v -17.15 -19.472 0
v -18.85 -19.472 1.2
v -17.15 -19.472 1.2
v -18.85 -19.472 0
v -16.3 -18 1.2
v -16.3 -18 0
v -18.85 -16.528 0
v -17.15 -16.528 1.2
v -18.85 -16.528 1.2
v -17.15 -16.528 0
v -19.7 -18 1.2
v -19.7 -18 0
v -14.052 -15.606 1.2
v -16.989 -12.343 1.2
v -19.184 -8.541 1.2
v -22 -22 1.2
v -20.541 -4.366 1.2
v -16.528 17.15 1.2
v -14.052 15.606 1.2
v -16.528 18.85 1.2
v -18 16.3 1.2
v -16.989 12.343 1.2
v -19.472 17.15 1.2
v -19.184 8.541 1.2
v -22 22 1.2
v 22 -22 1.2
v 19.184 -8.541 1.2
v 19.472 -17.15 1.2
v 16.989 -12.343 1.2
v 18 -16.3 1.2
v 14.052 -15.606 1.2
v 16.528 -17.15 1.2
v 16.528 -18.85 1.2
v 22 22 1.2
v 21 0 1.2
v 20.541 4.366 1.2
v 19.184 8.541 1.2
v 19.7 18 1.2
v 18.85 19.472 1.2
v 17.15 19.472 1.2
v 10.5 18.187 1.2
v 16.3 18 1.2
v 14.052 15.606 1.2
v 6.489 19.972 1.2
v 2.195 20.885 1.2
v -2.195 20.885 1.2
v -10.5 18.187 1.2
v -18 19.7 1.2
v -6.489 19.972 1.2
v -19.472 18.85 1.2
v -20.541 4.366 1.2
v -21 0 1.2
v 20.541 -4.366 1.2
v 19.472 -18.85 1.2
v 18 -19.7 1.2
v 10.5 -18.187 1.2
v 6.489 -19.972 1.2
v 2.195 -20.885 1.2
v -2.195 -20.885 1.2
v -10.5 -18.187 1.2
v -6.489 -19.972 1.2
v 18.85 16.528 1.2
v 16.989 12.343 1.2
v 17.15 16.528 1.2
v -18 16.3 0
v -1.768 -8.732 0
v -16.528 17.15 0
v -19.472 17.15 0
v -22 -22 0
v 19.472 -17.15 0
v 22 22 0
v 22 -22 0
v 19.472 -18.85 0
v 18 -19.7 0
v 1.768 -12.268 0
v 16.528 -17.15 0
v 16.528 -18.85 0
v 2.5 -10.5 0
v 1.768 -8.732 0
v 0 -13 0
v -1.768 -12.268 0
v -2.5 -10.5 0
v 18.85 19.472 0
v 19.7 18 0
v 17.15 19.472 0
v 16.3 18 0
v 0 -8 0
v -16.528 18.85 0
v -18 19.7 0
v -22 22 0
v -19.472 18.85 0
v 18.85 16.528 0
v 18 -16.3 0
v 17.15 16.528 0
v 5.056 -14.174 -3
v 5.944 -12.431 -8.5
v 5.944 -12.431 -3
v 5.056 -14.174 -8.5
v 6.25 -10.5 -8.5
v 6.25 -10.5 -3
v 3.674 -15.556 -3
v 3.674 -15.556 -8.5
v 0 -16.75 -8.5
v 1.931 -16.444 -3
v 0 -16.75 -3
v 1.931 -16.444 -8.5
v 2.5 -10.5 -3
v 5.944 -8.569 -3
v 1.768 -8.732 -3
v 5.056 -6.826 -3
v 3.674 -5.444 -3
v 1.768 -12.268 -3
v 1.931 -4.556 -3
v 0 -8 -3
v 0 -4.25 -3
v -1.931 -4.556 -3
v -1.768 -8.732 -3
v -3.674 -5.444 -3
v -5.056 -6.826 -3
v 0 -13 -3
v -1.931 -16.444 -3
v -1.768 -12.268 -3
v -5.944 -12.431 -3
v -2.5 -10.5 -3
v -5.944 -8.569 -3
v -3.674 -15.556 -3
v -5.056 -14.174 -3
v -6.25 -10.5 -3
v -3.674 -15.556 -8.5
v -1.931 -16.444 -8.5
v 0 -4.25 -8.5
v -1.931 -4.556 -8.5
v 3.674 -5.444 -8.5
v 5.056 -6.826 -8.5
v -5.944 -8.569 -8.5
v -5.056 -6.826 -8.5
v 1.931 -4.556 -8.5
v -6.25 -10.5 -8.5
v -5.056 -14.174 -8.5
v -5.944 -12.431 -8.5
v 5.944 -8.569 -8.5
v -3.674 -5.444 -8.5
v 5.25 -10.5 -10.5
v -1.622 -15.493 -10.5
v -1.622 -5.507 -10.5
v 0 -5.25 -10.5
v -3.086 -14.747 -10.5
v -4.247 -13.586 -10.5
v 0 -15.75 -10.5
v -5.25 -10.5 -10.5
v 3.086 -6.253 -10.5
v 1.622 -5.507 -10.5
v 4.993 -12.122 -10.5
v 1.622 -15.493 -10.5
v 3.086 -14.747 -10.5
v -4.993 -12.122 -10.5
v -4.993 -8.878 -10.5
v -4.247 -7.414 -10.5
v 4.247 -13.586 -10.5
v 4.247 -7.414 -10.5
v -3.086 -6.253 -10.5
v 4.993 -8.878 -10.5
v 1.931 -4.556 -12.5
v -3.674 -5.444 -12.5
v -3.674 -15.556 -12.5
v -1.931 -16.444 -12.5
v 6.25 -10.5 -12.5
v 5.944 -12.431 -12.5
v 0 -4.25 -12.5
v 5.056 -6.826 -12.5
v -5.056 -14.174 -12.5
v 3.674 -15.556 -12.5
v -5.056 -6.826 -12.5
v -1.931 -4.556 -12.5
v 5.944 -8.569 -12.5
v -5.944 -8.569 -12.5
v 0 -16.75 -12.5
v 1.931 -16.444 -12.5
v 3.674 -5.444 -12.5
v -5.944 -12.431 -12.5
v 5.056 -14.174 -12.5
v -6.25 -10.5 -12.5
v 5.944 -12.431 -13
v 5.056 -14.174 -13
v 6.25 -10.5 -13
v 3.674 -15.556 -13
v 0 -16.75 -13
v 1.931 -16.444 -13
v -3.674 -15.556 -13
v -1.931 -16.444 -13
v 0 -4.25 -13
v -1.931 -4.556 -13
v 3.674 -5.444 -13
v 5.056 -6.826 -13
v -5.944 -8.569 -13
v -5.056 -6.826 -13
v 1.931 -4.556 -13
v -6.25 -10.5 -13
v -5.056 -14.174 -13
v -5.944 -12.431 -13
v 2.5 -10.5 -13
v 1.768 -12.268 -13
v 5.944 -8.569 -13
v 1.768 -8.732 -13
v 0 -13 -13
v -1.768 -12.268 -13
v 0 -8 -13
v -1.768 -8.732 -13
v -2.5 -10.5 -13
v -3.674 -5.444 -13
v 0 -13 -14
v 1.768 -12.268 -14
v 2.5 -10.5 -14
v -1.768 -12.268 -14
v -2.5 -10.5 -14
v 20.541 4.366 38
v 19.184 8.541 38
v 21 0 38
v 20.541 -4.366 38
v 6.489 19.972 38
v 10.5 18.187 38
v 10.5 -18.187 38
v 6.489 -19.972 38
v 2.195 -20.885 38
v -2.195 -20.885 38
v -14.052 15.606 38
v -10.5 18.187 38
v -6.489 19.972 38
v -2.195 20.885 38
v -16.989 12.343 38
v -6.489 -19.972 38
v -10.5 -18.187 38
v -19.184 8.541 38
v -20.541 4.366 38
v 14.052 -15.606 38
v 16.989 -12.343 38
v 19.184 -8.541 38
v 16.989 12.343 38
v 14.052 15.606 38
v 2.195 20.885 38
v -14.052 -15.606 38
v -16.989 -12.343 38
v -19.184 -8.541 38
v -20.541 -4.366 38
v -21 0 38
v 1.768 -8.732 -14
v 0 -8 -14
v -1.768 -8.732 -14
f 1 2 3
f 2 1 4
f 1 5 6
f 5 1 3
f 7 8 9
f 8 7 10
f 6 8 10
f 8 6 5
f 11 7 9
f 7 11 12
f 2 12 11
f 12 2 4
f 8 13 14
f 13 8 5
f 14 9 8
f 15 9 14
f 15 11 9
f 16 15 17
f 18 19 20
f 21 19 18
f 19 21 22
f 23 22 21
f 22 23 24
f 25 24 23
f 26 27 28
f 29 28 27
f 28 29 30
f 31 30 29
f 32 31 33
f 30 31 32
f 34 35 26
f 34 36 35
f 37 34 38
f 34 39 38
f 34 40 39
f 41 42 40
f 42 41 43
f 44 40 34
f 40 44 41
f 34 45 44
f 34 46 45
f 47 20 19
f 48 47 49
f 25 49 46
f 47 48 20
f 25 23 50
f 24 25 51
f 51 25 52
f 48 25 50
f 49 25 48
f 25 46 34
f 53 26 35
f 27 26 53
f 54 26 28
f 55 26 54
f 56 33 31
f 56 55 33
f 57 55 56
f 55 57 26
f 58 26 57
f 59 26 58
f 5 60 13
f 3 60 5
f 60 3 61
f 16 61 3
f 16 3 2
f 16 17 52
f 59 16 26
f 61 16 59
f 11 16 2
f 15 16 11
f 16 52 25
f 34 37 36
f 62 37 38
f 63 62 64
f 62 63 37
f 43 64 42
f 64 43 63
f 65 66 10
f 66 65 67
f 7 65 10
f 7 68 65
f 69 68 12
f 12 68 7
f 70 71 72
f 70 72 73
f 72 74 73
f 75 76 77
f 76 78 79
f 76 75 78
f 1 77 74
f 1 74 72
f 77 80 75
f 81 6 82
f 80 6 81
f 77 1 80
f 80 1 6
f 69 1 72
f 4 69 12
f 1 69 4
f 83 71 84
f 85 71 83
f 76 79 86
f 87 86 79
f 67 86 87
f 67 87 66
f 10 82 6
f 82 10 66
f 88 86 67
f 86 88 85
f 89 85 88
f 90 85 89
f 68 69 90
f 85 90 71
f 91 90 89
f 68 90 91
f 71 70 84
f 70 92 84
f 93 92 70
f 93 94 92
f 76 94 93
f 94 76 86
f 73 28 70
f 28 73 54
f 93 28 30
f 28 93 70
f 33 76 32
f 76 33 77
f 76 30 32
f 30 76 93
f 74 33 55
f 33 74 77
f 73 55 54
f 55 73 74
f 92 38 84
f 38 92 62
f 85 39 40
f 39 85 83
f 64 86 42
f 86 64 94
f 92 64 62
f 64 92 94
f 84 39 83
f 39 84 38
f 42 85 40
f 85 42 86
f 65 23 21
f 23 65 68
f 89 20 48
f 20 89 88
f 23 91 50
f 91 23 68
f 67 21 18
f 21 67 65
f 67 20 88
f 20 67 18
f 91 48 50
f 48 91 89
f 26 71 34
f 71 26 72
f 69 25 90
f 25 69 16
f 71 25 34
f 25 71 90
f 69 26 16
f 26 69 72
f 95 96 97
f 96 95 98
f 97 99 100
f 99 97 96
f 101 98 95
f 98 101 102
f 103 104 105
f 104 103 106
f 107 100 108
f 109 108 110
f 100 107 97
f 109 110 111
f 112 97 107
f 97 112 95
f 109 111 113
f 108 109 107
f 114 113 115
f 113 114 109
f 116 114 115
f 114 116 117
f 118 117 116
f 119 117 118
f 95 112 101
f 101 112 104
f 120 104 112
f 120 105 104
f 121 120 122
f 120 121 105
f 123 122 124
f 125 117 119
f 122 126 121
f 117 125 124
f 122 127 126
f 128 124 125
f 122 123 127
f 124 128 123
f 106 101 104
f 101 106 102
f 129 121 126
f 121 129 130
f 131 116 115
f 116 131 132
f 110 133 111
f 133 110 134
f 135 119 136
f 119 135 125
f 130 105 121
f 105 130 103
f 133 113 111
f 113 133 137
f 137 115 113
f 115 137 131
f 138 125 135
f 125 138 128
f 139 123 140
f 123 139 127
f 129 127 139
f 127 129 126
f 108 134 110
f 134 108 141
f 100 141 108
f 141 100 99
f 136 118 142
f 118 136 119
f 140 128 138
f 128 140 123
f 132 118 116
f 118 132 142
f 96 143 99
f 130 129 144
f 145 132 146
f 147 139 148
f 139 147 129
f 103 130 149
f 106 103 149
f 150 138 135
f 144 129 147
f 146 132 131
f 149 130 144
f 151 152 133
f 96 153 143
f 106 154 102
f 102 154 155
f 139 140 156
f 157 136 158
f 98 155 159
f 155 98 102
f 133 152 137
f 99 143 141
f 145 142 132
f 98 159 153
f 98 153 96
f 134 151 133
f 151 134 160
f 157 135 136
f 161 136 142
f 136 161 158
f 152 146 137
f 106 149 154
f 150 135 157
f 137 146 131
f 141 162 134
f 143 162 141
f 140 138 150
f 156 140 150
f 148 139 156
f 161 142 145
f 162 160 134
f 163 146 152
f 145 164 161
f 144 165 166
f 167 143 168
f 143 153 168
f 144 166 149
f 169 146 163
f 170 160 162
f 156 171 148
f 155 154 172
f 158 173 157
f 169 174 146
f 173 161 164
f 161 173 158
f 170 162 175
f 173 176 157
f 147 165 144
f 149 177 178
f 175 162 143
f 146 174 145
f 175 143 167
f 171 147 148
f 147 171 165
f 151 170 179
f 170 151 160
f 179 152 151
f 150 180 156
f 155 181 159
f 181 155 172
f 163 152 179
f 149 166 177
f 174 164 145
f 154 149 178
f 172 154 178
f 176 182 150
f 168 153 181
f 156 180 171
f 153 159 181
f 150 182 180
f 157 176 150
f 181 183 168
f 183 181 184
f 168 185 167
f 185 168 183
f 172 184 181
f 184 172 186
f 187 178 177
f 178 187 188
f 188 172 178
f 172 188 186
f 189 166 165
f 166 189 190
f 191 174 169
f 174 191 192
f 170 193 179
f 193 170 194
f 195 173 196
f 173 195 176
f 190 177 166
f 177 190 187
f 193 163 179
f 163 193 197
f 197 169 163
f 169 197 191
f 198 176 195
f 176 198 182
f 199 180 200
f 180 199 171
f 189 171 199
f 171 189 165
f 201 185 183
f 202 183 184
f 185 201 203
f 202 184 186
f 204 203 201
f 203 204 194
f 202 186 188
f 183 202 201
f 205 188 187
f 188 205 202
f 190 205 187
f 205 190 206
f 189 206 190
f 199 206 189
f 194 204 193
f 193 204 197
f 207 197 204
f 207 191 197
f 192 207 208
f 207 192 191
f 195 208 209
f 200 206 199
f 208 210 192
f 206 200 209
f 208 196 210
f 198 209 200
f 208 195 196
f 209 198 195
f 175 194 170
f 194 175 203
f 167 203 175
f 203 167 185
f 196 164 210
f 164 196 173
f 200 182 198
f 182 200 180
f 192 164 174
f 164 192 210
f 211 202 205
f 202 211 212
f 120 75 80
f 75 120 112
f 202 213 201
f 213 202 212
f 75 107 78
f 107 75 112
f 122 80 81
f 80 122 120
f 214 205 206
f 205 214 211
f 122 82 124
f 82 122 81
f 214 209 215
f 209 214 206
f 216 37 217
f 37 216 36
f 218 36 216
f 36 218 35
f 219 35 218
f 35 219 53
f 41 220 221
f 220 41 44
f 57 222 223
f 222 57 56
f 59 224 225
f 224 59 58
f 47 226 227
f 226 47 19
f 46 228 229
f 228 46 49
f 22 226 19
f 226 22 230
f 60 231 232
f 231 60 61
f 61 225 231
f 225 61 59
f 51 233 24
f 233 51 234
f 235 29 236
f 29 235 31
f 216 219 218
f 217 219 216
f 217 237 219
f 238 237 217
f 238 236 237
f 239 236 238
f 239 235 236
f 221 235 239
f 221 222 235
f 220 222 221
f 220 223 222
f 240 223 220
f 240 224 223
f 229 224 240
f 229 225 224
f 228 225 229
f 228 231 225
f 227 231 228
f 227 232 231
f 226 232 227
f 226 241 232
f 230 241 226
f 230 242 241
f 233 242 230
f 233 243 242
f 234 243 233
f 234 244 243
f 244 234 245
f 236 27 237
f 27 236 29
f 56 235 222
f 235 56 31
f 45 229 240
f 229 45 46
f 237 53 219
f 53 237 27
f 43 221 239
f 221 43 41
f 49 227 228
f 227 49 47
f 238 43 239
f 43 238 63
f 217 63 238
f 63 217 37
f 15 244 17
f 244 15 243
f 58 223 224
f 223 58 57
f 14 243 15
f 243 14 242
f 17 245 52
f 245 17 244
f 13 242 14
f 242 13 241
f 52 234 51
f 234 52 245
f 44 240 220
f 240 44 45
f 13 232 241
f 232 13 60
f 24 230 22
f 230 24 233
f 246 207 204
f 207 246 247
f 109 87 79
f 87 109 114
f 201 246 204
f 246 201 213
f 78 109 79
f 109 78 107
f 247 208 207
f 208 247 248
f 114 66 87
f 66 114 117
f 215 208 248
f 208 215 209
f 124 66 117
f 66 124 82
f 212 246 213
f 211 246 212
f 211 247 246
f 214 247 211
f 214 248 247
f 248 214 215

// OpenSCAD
// Author: EiNSTeiN_ <einstein@g3nius.org>

module motor_42BYG48HJ50(mini_hyena=false) {

	cylinder(h=38,r=42/2);

	difference() {
		translate([-22,-22,0]) cube([44,44,1.2]);
		for(r=[0,90,180,270])
			rotate([0,0,r]) #translate([-36/2,-36/2, 0]) cylinder(h=1.2,r=3.4/2);
	}

	translate([0,(-44/2)+11.5,-14]) cylinder(r=5/2,h=14);


	// mini hyena: H=10mm, ID=5mm, OD=12.5mm
	if(mini_hyena) #translate([0,(-44/2)+11.5,-3]) rotate([180,0,0]) difference() {
		union() {
			cylinder(h=5.5,r=12.5/2);
			translate([0,0,5.5]) cylinder(h=2,r2=10.5/2, r1=12.5/2);
			translate([0,0,5.5+2]) cylinder(h=2, r2=12.5/2,r1=10.5/2);
			translate([0,0,9.5]) cylinder(h=0.5,r=12.5/2);
		}
		cylinder(h=10,r=5/2);
	}
}

motor_42BYG48HJ50(mini_hyena=true);
